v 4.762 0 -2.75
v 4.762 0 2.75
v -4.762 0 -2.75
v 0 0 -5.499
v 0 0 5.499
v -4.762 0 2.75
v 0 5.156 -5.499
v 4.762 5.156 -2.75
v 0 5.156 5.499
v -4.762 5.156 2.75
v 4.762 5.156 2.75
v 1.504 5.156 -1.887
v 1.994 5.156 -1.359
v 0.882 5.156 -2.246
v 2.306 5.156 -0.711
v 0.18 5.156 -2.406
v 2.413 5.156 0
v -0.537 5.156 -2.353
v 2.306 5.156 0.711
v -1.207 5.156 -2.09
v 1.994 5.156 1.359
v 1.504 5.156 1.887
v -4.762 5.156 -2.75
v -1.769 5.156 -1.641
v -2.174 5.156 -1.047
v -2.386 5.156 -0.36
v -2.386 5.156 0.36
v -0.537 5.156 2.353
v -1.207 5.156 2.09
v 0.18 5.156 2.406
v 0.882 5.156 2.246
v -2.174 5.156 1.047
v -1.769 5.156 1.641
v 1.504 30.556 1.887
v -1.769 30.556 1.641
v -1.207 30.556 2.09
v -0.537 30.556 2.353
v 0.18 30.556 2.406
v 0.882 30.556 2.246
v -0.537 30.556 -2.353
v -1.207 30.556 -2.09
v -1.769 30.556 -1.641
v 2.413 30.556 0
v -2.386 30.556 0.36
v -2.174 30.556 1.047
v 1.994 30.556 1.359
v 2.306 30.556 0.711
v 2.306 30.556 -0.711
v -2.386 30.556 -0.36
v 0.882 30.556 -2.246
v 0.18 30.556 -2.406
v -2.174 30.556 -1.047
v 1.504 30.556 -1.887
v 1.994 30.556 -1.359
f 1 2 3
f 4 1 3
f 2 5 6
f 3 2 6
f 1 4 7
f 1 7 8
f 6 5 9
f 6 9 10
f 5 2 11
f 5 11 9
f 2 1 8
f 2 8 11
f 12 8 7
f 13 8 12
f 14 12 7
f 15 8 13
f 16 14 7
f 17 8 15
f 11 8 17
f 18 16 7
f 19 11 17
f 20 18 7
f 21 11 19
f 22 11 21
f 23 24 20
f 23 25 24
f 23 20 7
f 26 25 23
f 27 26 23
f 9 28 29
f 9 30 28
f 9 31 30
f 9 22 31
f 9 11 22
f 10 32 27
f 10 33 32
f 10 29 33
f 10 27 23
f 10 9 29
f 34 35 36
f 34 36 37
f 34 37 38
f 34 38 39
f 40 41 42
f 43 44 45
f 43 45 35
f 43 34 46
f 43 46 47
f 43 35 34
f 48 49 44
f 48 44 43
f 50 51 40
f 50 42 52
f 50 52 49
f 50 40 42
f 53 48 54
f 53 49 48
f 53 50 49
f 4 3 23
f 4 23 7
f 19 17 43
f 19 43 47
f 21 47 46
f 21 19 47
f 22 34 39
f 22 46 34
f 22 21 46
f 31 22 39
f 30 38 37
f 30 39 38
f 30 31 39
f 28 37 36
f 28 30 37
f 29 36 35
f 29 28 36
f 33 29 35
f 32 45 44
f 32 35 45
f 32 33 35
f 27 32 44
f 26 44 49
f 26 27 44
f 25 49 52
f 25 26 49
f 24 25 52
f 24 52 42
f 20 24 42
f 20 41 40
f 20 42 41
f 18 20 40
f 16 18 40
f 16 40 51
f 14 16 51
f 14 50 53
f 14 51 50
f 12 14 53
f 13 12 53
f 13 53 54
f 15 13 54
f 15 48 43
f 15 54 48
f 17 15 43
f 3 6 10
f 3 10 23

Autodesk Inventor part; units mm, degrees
ref_plane "YZ Plane" through (0, 0, 0) normal (1, 0, 0) x (0, 1, 0)
ref_plane "XZ Plane" through (0, 0, 0) normal (0, 1, 0) x (-1, 0, 0)
ref_plane "XY Plane" through (0, 0, 0) normal (0, 0, 1) x (1, 0, 0)
sketch "Sketch1" plane through (0, 0, 0) normal (0, 1, 0) x (-1, 0, 0)
  line L0 (4.7625, -2.7496) -> (0, -5.4993)
  line L1 (0, -5.4993) -> (-4.7625, -2.7496)
  line L2 (-4.7625, -2.7496) -> (-4.7625, 2.7496)
  line L3 (-4.7625, 2.7496) -> (0, 5.4993)
  line L4 (0, 5.4993) -> (4.7625, 2.7496)
  line L5 (4.7625, 2.7496) -> (4.7625, -2.7496)
  point P0 (0, 0)
  point P1 (0, 0)
  dimension "d0" = 9.525
extrude "Extrusion1" add sketch "Sketch1" along normal blind 5.1562
sketch "Sketch2" plane through (0, 5.1562, 0) normal (0, 1, 0) x (1, 0, 0)
  circle A0 centre (0, 0) radius 2.413
  dimension "d3" = 4.826
extrude "Extrusion2" add sketch "Sketch2" along normal blind 25.4
properties part number "10-32 bolt"
